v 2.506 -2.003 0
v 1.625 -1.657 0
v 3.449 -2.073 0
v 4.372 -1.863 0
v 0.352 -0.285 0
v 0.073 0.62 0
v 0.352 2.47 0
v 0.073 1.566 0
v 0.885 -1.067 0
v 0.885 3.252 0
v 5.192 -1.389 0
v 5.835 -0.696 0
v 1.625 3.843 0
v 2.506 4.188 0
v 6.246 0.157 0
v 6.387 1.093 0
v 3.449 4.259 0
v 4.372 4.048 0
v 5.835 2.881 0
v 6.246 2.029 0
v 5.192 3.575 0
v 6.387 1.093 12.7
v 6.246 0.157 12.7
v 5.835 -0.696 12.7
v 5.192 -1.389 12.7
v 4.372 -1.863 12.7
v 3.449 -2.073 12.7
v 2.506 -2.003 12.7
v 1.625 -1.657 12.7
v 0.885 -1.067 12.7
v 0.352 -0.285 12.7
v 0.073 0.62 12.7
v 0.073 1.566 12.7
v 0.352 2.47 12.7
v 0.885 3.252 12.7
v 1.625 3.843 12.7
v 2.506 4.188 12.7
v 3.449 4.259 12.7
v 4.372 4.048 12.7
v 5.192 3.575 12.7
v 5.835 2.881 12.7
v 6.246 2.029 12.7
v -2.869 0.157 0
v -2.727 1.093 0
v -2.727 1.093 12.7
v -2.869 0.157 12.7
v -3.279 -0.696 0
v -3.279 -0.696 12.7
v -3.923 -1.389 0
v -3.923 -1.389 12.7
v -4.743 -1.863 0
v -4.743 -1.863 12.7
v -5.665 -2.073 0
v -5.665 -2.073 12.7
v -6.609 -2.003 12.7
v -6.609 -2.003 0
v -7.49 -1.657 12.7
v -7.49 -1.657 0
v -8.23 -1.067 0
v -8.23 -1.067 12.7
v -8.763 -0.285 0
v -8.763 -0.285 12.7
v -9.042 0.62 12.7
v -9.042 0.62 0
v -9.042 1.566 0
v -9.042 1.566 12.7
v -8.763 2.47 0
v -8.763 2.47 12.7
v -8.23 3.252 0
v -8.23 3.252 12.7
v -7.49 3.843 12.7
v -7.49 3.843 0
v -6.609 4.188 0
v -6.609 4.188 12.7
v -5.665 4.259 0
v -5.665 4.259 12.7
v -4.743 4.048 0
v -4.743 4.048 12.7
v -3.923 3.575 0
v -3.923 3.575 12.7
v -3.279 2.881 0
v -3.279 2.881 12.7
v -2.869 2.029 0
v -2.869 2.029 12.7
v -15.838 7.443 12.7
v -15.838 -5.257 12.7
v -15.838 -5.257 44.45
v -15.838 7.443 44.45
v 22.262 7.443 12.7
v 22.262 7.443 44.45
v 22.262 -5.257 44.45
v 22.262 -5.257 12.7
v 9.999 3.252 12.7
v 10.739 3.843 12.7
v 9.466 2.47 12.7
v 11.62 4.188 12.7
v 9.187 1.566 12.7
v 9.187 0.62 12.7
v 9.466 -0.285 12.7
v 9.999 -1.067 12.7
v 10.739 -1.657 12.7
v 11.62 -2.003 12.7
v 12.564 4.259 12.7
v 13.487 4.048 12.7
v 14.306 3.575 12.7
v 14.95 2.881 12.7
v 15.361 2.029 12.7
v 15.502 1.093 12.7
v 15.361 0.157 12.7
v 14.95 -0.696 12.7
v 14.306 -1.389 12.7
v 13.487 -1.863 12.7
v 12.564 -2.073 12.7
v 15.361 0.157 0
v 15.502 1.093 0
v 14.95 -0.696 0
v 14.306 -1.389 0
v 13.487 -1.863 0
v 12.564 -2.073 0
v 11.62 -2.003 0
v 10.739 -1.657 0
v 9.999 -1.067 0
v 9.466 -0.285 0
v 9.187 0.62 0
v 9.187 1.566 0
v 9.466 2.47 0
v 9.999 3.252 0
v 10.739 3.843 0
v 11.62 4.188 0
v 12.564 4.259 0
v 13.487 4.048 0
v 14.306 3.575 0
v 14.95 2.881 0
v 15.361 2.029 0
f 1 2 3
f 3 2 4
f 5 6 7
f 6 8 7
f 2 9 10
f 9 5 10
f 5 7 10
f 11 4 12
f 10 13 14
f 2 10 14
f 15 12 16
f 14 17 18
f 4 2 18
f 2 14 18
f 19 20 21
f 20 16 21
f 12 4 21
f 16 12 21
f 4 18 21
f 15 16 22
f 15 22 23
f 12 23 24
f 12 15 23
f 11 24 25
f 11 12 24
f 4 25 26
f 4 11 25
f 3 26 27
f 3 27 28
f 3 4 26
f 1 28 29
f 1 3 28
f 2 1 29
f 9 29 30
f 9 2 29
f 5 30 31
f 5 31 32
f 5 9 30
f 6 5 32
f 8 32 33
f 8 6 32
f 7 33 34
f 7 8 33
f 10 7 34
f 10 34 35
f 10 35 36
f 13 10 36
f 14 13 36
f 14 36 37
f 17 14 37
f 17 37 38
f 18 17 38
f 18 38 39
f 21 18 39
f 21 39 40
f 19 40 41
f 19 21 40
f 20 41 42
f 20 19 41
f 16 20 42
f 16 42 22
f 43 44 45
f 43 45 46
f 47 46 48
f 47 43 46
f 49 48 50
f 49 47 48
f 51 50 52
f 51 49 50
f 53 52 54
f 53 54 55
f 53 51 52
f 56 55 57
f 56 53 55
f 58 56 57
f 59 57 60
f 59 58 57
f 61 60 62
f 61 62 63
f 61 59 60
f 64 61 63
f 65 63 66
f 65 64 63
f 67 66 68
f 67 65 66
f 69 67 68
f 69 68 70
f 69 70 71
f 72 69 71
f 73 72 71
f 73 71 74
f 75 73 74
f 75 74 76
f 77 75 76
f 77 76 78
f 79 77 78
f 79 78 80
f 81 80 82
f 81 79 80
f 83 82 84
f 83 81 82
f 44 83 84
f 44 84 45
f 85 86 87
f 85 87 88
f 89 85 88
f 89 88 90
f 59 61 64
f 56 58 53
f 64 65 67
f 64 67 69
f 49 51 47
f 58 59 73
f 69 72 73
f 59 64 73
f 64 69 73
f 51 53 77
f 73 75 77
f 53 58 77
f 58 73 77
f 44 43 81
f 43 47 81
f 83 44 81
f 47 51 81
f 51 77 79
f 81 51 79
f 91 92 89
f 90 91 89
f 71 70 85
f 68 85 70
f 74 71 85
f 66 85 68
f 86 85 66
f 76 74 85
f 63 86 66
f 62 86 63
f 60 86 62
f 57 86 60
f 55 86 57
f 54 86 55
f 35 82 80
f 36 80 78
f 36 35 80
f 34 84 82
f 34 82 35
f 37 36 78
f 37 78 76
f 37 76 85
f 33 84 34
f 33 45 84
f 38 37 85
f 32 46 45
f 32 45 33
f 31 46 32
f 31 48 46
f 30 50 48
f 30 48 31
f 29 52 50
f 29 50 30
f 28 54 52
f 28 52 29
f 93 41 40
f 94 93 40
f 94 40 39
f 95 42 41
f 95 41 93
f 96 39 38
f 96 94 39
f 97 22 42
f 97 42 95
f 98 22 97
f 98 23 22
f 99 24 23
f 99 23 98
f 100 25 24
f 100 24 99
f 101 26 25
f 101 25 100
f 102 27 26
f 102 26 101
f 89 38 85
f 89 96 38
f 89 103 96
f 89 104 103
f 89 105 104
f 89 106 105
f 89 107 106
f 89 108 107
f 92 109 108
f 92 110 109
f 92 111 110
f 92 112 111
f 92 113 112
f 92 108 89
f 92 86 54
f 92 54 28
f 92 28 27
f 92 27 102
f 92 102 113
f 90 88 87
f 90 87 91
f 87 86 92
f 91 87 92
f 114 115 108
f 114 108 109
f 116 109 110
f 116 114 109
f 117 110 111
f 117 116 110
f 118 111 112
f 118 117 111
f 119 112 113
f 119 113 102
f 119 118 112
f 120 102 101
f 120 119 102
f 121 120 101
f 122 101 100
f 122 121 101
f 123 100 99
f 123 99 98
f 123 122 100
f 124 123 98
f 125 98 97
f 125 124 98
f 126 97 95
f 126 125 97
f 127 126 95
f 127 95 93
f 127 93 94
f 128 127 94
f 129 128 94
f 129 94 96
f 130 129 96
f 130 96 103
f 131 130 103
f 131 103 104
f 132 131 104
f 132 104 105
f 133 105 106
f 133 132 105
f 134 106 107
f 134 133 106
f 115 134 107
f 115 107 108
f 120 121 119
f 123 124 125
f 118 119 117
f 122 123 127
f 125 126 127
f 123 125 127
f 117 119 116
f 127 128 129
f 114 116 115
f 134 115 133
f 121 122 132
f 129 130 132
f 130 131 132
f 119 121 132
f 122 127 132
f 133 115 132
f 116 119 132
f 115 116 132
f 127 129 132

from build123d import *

# Parameters (mm, degrees)
F0_W     = 38.1
F0_H     = 12.7
F1_DEPTH = 6.35
F2_W     = 38.1
F2_H     = 12.7
F3_DEPTH = 38.1
F4_W     = 38.1
F4_H     = 12.7
F4_R     = 3.175
F5_DEPTH = 12.7


with BuildPart() as f1:
    # F0 (on Top) → F1 (new body)
    with BuildSketch(Plane.XY):
        with Locations((3.2120794058, 1.0928753239)):
            Rectangle(F0_W, F0_H)
    extrude(amount=F1_DEPTH)

    # F2 (on face) → F3 (join)
    with BuildSketch(Plane.XY.offset(6.35)):
        with Locations((3.2120794058, 1.0928753239)):
            Rectangle(F2_W, F2_H)
    extrude(amount=F3_DEPTH)

    # F4 (on face) → F5 (cut)
    with BuildSketch(Plane(origin=(0, 0, 0), x_dir=(1, 0, 0), z_dir=(0, 0, -1))):
        with Locations((3.2120794058, -1.0928753239)):
            Rectangle(F4_W, F4_H)
        with Locations((-5.9024819942, -1.0928753239)):
            Circle(F4_R, mode=Mode.SUBTRACT)
        with Locations((3.2120794058, -1.0928753239)):
            Circle(F4_R, mode=Mode.SUBTRACT)
        with Locations((12.3266408058, -1.0928753239)):
            Circle(F4_R, mode=Mode.SUBTRACT)
    extrude(amount=-F5_DEPTH, mode=Mode.SUBTRACT)


solid = f1.part
